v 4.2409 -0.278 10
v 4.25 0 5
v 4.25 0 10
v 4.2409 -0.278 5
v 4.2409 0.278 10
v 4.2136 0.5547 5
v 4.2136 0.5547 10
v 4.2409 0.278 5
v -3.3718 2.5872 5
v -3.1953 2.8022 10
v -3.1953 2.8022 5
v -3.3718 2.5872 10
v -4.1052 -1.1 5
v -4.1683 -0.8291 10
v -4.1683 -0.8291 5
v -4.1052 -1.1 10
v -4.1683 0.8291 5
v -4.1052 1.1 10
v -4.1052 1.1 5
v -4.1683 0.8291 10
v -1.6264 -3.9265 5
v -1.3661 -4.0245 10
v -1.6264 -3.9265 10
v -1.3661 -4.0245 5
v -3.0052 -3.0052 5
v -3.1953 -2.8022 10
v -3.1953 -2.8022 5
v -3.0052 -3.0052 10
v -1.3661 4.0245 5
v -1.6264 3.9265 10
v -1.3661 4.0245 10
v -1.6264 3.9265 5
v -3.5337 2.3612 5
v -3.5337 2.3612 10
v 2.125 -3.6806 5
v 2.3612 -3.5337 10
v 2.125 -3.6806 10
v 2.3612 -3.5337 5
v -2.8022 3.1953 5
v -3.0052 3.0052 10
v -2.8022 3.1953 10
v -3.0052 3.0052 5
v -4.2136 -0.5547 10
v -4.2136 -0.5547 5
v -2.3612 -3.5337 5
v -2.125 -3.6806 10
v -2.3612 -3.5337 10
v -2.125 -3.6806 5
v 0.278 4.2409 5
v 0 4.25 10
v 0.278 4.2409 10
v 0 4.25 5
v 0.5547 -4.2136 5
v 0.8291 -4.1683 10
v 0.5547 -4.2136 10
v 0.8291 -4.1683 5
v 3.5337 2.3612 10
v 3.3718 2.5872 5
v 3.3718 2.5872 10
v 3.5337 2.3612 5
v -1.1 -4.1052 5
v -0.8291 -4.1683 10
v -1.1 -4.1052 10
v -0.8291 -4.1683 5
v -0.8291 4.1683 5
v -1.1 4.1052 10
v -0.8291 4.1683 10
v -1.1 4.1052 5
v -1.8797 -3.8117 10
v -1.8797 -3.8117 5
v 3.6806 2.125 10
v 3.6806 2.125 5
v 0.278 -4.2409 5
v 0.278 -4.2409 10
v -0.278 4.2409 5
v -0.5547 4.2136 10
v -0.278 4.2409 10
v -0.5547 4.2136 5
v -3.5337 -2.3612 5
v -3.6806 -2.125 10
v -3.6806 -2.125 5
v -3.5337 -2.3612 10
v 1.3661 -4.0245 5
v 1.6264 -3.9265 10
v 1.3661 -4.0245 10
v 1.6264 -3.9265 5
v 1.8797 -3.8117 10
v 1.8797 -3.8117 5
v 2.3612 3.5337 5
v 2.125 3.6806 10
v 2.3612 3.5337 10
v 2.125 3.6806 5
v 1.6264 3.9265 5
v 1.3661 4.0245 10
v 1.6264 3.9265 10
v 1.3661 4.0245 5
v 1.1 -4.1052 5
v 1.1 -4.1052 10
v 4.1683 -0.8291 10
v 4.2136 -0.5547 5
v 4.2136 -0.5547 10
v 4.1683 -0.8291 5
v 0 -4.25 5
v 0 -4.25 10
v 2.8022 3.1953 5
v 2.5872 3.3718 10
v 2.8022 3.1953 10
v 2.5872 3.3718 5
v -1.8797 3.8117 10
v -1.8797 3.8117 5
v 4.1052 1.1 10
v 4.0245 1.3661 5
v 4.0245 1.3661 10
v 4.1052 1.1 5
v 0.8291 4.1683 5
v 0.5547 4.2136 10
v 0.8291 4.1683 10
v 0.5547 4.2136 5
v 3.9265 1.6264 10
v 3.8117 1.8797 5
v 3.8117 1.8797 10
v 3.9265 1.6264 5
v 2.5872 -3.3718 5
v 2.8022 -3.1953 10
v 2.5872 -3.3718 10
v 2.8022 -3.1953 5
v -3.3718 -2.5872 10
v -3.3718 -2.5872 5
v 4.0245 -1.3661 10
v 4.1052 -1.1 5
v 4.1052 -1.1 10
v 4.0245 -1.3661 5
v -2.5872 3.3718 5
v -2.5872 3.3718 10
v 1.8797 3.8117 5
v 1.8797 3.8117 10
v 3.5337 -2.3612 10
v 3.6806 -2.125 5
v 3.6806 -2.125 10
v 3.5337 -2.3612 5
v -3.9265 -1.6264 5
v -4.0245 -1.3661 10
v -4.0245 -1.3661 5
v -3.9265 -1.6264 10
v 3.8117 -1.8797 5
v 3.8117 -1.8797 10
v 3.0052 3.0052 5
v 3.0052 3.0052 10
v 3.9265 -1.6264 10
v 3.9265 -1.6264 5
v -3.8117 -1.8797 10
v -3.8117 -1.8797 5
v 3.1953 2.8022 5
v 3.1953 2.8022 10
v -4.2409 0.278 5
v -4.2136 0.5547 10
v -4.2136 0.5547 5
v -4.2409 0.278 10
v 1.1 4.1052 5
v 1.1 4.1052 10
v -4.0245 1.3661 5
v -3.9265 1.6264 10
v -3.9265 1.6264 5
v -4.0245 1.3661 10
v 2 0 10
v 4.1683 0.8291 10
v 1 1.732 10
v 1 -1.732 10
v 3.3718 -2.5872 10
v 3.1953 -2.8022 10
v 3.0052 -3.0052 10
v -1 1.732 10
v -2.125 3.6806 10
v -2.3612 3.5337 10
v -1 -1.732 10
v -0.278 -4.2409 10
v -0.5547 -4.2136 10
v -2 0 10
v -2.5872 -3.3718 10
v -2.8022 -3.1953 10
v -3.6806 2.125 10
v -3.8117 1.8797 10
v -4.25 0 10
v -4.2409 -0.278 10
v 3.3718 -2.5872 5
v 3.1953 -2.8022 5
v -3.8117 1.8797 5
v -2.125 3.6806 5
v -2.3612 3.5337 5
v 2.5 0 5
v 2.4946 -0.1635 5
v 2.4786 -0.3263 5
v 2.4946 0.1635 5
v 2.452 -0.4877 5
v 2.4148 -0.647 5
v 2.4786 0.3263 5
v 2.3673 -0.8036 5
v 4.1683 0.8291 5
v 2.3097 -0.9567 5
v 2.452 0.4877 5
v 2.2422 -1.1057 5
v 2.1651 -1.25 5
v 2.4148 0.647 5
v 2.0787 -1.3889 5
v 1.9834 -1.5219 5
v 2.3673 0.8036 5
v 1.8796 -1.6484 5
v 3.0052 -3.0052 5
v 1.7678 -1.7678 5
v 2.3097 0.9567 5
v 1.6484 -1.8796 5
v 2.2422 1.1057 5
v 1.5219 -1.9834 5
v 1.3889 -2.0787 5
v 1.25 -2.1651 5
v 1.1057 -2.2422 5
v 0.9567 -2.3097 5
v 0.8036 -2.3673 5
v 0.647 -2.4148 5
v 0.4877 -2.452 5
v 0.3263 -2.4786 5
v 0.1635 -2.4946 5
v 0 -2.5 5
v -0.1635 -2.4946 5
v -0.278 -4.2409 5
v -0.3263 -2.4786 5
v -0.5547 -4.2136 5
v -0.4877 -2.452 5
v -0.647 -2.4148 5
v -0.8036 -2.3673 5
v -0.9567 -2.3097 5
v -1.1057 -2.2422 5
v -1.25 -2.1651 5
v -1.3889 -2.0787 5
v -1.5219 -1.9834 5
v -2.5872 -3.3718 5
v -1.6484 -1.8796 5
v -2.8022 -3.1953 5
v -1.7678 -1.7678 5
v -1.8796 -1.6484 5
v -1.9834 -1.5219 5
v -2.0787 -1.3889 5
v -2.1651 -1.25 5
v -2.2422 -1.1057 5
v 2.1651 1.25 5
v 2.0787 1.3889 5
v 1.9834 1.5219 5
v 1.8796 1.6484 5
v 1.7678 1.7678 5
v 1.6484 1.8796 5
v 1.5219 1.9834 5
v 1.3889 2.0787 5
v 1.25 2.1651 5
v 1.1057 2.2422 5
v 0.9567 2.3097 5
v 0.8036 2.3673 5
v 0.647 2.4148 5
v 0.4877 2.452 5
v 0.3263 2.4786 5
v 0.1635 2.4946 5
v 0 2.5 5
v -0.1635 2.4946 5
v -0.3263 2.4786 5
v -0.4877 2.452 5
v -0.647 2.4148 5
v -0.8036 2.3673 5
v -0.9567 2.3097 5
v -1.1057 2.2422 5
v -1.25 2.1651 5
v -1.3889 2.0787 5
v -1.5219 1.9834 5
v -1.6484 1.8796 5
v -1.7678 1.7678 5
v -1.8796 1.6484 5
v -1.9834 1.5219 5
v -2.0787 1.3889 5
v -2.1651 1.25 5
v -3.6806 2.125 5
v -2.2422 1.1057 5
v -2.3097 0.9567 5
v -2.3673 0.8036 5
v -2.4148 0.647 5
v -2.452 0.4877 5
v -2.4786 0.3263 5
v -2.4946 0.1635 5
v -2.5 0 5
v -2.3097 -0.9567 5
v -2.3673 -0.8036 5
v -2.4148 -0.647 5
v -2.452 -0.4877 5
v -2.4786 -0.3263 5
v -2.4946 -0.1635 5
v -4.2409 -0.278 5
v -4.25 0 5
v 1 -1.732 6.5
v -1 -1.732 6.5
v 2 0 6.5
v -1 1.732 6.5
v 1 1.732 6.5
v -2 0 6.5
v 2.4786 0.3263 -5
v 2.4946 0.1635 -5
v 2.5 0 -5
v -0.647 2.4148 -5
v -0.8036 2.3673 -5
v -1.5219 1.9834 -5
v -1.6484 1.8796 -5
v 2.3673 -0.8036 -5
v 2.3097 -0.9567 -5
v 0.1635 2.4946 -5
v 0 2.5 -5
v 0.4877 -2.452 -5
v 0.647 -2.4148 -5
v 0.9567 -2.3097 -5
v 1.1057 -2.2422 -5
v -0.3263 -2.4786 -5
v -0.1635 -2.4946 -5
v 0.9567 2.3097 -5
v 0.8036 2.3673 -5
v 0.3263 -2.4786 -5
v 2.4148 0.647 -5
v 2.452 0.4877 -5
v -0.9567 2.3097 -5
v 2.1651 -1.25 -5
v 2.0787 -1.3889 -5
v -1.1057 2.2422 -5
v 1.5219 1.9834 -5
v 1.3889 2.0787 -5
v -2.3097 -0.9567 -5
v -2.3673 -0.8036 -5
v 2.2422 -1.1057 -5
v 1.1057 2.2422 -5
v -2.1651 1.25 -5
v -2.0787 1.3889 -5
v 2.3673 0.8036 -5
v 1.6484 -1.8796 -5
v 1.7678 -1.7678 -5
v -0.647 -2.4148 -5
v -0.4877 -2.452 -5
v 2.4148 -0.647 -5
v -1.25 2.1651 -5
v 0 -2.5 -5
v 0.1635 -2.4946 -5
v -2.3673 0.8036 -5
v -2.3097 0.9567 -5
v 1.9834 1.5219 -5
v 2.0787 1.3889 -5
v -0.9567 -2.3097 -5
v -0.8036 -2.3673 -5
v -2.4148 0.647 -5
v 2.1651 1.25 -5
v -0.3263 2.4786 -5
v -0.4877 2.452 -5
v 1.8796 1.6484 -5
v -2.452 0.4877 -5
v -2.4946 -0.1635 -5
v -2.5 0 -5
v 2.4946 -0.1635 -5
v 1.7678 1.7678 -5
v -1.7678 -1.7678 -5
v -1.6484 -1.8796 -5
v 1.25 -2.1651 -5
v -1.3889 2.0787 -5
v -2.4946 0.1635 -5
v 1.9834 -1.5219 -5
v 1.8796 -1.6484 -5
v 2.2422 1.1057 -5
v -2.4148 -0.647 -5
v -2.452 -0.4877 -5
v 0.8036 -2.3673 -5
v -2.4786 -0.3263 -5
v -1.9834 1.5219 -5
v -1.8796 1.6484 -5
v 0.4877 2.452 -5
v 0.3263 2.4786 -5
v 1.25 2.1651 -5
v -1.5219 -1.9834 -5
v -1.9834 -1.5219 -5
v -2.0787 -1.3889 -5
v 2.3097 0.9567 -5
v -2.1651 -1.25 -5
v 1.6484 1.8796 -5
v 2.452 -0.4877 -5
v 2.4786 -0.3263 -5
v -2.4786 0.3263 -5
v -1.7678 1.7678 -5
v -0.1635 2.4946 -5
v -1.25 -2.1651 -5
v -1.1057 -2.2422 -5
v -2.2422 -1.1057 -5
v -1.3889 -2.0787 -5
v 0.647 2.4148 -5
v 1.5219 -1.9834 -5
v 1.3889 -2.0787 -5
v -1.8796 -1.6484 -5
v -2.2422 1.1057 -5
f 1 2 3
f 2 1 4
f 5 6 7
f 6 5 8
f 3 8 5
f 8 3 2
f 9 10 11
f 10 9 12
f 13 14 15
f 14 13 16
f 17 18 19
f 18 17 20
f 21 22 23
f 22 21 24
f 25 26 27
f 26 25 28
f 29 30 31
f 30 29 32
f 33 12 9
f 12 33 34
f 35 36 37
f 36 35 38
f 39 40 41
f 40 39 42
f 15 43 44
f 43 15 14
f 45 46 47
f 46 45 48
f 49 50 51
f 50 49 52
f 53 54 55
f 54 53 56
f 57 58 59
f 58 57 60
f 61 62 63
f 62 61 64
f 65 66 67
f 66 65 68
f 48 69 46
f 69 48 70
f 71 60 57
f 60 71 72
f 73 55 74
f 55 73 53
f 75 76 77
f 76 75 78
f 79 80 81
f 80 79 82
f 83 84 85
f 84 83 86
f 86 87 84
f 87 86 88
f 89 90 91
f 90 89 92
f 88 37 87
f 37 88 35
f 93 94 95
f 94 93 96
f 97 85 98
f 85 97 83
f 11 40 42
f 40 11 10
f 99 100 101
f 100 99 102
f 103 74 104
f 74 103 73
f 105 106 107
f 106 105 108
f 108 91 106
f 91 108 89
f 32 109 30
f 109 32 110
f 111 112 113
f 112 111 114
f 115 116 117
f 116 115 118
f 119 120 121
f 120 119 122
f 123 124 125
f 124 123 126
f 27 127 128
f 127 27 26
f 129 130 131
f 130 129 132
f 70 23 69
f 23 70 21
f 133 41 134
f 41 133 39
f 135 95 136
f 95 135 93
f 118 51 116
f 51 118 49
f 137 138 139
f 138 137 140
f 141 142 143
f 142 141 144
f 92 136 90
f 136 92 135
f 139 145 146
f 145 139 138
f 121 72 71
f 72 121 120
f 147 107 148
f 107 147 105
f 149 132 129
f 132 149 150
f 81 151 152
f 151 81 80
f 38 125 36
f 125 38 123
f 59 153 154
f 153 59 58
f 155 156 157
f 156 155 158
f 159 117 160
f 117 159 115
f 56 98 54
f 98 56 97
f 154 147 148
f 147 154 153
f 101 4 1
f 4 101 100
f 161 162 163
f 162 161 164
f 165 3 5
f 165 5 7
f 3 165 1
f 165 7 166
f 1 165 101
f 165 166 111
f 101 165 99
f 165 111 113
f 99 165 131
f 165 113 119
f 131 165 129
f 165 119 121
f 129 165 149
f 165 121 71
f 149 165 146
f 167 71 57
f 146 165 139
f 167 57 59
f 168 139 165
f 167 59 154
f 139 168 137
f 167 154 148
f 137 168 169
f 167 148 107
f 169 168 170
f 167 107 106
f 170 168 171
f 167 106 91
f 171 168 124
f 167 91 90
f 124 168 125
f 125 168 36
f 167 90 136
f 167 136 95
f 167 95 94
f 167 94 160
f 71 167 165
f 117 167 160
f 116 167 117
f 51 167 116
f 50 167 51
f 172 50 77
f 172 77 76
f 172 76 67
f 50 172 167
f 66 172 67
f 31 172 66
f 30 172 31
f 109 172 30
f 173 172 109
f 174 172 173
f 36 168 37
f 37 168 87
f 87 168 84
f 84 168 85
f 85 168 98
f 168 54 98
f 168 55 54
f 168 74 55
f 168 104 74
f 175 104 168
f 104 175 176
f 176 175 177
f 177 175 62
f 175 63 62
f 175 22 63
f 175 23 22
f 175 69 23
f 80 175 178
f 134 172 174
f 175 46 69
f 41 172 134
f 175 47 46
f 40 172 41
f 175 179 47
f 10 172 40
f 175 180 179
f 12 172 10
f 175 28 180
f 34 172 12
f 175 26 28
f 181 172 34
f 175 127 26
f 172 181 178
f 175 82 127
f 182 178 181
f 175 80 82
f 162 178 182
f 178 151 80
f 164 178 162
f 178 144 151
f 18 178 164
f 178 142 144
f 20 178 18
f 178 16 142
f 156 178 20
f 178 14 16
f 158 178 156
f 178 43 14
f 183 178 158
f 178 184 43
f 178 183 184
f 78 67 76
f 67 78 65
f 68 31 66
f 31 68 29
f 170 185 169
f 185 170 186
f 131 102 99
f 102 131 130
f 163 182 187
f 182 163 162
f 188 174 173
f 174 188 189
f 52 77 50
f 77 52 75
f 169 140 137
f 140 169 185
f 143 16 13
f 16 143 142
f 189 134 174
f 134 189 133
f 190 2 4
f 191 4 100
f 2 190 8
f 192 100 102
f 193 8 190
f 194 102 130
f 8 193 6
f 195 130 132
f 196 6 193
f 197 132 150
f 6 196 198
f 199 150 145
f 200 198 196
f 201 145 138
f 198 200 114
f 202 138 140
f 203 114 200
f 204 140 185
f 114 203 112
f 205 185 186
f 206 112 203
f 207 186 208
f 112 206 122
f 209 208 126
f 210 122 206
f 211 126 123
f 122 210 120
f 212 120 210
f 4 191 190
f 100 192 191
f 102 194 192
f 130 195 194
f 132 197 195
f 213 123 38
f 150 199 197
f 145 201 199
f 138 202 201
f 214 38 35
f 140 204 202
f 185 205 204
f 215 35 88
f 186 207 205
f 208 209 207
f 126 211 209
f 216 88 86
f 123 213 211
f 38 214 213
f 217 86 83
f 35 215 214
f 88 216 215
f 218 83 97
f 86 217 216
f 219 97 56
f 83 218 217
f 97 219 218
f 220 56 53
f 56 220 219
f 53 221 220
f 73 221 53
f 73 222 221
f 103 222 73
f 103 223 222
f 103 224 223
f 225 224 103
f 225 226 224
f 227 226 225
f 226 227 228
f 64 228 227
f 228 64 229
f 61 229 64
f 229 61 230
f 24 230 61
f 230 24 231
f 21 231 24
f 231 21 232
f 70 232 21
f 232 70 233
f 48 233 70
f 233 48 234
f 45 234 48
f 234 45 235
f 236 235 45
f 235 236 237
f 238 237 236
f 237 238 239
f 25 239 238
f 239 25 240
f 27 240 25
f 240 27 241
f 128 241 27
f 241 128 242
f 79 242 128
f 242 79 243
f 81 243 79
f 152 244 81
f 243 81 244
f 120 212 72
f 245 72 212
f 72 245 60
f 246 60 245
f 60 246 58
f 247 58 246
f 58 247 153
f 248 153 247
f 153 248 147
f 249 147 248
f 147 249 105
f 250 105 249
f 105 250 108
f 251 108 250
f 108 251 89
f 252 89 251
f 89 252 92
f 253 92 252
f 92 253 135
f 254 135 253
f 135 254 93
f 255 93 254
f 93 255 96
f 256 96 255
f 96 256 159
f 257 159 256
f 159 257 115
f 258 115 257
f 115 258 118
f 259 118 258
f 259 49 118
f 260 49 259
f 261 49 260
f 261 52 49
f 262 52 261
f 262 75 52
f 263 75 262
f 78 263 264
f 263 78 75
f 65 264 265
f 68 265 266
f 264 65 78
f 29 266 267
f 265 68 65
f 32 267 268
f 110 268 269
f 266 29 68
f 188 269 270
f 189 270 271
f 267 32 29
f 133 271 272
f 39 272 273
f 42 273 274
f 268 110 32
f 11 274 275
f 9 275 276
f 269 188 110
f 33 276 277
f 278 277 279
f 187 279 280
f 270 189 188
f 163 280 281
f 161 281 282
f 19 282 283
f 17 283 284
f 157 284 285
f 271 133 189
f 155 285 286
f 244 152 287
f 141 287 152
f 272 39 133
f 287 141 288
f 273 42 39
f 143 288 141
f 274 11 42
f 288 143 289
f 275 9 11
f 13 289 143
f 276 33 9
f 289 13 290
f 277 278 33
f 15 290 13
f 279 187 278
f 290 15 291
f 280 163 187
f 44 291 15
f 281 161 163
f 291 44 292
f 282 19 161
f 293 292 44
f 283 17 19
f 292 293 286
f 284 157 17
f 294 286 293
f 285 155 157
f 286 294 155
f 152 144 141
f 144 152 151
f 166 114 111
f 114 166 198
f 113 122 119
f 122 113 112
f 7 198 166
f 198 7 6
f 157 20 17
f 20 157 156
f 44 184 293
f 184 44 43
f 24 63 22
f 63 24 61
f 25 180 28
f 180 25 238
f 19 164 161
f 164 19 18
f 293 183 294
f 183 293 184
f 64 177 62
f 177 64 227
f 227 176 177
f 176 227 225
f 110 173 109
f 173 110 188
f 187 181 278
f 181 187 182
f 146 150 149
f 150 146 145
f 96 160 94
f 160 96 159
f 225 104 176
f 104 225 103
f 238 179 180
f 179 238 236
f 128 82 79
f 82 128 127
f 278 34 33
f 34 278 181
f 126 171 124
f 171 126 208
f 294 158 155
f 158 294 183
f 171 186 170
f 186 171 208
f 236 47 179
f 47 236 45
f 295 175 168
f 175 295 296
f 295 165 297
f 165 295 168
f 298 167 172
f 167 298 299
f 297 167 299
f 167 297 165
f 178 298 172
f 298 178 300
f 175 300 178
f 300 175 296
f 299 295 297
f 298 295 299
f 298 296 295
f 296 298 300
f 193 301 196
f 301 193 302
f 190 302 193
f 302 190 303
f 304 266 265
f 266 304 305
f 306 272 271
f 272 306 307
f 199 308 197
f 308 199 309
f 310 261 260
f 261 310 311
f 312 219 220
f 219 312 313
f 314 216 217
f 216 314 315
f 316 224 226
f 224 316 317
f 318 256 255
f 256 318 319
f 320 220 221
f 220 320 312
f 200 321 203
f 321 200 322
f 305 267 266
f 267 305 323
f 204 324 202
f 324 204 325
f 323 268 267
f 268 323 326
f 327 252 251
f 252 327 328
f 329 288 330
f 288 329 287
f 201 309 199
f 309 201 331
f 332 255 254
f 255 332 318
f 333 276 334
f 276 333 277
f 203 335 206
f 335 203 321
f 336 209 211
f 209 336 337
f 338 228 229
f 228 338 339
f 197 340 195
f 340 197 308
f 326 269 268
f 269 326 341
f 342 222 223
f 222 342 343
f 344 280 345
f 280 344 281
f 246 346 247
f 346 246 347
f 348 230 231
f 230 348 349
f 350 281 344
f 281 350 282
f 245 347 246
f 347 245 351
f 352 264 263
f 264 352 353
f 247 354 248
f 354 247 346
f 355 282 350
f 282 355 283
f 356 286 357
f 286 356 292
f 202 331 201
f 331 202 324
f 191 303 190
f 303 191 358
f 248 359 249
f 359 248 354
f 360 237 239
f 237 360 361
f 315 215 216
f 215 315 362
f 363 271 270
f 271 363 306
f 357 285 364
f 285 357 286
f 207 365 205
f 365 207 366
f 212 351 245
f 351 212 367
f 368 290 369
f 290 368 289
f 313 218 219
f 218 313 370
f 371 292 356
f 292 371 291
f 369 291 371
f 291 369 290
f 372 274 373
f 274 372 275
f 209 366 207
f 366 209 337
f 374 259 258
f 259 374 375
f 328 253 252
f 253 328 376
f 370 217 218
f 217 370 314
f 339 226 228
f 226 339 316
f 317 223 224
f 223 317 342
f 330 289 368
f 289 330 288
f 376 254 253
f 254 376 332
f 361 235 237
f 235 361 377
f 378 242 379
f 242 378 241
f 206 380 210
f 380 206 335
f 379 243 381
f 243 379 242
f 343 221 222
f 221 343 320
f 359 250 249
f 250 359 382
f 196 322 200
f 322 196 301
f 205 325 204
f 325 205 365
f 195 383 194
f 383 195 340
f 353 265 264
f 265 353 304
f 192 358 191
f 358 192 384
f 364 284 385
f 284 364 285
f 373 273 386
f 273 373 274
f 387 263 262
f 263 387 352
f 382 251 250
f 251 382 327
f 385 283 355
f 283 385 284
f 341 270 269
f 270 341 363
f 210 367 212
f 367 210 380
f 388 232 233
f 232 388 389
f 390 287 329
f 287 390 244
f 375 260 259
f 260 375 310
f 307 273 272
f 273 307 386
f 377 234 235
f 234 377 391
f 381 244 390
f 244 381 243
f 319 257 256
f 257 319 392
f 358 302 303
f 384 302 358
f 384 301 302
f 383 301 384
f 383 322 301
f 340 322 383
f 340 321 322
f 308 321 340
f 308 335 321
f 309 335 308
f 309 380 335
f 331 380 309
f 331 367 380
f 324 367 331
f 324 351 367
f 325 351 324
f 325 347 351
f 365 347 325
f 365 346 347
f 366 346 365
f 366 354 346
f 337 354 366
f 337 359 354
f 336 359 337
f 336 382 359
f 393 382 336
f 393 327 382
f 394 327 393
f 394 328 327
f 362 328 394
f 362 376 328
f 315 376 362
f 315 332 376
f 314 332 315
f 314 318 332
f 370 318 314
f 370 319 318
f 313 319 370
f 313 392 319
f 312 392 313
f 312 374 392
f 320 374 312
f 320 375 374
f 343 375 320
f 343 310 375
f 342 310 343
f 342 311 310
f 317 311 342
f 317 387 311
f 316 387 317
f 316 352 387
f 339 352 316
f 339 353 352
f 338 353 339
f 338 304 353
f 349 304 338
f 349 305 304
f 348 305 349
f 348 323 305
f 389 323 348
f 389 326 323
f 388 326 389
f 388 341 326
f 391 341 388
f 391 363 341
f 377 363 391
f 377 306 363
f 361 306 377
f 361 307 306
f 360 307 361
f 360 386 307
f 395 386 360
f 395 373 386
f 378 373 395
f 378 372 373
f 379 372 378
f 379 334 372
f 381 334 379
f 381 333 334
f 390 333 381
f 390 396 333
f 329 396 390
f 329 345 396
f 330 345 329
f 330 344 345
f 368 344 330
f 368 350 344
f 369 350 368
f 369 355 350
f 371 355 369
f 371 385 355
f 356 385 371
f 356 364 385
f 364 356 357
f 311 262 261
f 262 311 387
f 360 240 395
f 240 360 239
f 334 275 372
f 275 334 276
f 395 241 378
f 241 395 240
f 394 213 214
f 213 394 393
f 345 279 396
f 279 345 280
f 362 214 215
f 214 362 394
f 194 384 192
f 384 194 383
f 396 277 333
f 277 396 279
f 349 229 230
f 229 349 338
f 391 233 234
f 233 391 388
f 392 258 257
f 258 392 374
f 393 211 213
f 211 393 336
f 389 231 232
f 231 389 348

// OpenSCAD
$fn=96;

module socket_head_cap_screw(d=5.0, L=10.0, head_d=8.5, head_h=5.0, socket_d=4.0, socket_depth=3.5) {
    union() {
        translate([0,0,-L/2])
            cylinder(d=d, h=L, $fn=96);

        translate([0,0,L/2])
            difference() {
                cylinder(d=head_d, h=head_h, $fn=96);
                translate([0,0,head_h - socket_depth])
                    cylinder(d=socket_d, h=socket_depth + 0.2, $fn=6);
            }
    }
}

socket_head_cap_screw(d=5.0, L=10.0, head_d=8.5, head_h=5.0, socket_d=4.0, socket_depth=3.5);
